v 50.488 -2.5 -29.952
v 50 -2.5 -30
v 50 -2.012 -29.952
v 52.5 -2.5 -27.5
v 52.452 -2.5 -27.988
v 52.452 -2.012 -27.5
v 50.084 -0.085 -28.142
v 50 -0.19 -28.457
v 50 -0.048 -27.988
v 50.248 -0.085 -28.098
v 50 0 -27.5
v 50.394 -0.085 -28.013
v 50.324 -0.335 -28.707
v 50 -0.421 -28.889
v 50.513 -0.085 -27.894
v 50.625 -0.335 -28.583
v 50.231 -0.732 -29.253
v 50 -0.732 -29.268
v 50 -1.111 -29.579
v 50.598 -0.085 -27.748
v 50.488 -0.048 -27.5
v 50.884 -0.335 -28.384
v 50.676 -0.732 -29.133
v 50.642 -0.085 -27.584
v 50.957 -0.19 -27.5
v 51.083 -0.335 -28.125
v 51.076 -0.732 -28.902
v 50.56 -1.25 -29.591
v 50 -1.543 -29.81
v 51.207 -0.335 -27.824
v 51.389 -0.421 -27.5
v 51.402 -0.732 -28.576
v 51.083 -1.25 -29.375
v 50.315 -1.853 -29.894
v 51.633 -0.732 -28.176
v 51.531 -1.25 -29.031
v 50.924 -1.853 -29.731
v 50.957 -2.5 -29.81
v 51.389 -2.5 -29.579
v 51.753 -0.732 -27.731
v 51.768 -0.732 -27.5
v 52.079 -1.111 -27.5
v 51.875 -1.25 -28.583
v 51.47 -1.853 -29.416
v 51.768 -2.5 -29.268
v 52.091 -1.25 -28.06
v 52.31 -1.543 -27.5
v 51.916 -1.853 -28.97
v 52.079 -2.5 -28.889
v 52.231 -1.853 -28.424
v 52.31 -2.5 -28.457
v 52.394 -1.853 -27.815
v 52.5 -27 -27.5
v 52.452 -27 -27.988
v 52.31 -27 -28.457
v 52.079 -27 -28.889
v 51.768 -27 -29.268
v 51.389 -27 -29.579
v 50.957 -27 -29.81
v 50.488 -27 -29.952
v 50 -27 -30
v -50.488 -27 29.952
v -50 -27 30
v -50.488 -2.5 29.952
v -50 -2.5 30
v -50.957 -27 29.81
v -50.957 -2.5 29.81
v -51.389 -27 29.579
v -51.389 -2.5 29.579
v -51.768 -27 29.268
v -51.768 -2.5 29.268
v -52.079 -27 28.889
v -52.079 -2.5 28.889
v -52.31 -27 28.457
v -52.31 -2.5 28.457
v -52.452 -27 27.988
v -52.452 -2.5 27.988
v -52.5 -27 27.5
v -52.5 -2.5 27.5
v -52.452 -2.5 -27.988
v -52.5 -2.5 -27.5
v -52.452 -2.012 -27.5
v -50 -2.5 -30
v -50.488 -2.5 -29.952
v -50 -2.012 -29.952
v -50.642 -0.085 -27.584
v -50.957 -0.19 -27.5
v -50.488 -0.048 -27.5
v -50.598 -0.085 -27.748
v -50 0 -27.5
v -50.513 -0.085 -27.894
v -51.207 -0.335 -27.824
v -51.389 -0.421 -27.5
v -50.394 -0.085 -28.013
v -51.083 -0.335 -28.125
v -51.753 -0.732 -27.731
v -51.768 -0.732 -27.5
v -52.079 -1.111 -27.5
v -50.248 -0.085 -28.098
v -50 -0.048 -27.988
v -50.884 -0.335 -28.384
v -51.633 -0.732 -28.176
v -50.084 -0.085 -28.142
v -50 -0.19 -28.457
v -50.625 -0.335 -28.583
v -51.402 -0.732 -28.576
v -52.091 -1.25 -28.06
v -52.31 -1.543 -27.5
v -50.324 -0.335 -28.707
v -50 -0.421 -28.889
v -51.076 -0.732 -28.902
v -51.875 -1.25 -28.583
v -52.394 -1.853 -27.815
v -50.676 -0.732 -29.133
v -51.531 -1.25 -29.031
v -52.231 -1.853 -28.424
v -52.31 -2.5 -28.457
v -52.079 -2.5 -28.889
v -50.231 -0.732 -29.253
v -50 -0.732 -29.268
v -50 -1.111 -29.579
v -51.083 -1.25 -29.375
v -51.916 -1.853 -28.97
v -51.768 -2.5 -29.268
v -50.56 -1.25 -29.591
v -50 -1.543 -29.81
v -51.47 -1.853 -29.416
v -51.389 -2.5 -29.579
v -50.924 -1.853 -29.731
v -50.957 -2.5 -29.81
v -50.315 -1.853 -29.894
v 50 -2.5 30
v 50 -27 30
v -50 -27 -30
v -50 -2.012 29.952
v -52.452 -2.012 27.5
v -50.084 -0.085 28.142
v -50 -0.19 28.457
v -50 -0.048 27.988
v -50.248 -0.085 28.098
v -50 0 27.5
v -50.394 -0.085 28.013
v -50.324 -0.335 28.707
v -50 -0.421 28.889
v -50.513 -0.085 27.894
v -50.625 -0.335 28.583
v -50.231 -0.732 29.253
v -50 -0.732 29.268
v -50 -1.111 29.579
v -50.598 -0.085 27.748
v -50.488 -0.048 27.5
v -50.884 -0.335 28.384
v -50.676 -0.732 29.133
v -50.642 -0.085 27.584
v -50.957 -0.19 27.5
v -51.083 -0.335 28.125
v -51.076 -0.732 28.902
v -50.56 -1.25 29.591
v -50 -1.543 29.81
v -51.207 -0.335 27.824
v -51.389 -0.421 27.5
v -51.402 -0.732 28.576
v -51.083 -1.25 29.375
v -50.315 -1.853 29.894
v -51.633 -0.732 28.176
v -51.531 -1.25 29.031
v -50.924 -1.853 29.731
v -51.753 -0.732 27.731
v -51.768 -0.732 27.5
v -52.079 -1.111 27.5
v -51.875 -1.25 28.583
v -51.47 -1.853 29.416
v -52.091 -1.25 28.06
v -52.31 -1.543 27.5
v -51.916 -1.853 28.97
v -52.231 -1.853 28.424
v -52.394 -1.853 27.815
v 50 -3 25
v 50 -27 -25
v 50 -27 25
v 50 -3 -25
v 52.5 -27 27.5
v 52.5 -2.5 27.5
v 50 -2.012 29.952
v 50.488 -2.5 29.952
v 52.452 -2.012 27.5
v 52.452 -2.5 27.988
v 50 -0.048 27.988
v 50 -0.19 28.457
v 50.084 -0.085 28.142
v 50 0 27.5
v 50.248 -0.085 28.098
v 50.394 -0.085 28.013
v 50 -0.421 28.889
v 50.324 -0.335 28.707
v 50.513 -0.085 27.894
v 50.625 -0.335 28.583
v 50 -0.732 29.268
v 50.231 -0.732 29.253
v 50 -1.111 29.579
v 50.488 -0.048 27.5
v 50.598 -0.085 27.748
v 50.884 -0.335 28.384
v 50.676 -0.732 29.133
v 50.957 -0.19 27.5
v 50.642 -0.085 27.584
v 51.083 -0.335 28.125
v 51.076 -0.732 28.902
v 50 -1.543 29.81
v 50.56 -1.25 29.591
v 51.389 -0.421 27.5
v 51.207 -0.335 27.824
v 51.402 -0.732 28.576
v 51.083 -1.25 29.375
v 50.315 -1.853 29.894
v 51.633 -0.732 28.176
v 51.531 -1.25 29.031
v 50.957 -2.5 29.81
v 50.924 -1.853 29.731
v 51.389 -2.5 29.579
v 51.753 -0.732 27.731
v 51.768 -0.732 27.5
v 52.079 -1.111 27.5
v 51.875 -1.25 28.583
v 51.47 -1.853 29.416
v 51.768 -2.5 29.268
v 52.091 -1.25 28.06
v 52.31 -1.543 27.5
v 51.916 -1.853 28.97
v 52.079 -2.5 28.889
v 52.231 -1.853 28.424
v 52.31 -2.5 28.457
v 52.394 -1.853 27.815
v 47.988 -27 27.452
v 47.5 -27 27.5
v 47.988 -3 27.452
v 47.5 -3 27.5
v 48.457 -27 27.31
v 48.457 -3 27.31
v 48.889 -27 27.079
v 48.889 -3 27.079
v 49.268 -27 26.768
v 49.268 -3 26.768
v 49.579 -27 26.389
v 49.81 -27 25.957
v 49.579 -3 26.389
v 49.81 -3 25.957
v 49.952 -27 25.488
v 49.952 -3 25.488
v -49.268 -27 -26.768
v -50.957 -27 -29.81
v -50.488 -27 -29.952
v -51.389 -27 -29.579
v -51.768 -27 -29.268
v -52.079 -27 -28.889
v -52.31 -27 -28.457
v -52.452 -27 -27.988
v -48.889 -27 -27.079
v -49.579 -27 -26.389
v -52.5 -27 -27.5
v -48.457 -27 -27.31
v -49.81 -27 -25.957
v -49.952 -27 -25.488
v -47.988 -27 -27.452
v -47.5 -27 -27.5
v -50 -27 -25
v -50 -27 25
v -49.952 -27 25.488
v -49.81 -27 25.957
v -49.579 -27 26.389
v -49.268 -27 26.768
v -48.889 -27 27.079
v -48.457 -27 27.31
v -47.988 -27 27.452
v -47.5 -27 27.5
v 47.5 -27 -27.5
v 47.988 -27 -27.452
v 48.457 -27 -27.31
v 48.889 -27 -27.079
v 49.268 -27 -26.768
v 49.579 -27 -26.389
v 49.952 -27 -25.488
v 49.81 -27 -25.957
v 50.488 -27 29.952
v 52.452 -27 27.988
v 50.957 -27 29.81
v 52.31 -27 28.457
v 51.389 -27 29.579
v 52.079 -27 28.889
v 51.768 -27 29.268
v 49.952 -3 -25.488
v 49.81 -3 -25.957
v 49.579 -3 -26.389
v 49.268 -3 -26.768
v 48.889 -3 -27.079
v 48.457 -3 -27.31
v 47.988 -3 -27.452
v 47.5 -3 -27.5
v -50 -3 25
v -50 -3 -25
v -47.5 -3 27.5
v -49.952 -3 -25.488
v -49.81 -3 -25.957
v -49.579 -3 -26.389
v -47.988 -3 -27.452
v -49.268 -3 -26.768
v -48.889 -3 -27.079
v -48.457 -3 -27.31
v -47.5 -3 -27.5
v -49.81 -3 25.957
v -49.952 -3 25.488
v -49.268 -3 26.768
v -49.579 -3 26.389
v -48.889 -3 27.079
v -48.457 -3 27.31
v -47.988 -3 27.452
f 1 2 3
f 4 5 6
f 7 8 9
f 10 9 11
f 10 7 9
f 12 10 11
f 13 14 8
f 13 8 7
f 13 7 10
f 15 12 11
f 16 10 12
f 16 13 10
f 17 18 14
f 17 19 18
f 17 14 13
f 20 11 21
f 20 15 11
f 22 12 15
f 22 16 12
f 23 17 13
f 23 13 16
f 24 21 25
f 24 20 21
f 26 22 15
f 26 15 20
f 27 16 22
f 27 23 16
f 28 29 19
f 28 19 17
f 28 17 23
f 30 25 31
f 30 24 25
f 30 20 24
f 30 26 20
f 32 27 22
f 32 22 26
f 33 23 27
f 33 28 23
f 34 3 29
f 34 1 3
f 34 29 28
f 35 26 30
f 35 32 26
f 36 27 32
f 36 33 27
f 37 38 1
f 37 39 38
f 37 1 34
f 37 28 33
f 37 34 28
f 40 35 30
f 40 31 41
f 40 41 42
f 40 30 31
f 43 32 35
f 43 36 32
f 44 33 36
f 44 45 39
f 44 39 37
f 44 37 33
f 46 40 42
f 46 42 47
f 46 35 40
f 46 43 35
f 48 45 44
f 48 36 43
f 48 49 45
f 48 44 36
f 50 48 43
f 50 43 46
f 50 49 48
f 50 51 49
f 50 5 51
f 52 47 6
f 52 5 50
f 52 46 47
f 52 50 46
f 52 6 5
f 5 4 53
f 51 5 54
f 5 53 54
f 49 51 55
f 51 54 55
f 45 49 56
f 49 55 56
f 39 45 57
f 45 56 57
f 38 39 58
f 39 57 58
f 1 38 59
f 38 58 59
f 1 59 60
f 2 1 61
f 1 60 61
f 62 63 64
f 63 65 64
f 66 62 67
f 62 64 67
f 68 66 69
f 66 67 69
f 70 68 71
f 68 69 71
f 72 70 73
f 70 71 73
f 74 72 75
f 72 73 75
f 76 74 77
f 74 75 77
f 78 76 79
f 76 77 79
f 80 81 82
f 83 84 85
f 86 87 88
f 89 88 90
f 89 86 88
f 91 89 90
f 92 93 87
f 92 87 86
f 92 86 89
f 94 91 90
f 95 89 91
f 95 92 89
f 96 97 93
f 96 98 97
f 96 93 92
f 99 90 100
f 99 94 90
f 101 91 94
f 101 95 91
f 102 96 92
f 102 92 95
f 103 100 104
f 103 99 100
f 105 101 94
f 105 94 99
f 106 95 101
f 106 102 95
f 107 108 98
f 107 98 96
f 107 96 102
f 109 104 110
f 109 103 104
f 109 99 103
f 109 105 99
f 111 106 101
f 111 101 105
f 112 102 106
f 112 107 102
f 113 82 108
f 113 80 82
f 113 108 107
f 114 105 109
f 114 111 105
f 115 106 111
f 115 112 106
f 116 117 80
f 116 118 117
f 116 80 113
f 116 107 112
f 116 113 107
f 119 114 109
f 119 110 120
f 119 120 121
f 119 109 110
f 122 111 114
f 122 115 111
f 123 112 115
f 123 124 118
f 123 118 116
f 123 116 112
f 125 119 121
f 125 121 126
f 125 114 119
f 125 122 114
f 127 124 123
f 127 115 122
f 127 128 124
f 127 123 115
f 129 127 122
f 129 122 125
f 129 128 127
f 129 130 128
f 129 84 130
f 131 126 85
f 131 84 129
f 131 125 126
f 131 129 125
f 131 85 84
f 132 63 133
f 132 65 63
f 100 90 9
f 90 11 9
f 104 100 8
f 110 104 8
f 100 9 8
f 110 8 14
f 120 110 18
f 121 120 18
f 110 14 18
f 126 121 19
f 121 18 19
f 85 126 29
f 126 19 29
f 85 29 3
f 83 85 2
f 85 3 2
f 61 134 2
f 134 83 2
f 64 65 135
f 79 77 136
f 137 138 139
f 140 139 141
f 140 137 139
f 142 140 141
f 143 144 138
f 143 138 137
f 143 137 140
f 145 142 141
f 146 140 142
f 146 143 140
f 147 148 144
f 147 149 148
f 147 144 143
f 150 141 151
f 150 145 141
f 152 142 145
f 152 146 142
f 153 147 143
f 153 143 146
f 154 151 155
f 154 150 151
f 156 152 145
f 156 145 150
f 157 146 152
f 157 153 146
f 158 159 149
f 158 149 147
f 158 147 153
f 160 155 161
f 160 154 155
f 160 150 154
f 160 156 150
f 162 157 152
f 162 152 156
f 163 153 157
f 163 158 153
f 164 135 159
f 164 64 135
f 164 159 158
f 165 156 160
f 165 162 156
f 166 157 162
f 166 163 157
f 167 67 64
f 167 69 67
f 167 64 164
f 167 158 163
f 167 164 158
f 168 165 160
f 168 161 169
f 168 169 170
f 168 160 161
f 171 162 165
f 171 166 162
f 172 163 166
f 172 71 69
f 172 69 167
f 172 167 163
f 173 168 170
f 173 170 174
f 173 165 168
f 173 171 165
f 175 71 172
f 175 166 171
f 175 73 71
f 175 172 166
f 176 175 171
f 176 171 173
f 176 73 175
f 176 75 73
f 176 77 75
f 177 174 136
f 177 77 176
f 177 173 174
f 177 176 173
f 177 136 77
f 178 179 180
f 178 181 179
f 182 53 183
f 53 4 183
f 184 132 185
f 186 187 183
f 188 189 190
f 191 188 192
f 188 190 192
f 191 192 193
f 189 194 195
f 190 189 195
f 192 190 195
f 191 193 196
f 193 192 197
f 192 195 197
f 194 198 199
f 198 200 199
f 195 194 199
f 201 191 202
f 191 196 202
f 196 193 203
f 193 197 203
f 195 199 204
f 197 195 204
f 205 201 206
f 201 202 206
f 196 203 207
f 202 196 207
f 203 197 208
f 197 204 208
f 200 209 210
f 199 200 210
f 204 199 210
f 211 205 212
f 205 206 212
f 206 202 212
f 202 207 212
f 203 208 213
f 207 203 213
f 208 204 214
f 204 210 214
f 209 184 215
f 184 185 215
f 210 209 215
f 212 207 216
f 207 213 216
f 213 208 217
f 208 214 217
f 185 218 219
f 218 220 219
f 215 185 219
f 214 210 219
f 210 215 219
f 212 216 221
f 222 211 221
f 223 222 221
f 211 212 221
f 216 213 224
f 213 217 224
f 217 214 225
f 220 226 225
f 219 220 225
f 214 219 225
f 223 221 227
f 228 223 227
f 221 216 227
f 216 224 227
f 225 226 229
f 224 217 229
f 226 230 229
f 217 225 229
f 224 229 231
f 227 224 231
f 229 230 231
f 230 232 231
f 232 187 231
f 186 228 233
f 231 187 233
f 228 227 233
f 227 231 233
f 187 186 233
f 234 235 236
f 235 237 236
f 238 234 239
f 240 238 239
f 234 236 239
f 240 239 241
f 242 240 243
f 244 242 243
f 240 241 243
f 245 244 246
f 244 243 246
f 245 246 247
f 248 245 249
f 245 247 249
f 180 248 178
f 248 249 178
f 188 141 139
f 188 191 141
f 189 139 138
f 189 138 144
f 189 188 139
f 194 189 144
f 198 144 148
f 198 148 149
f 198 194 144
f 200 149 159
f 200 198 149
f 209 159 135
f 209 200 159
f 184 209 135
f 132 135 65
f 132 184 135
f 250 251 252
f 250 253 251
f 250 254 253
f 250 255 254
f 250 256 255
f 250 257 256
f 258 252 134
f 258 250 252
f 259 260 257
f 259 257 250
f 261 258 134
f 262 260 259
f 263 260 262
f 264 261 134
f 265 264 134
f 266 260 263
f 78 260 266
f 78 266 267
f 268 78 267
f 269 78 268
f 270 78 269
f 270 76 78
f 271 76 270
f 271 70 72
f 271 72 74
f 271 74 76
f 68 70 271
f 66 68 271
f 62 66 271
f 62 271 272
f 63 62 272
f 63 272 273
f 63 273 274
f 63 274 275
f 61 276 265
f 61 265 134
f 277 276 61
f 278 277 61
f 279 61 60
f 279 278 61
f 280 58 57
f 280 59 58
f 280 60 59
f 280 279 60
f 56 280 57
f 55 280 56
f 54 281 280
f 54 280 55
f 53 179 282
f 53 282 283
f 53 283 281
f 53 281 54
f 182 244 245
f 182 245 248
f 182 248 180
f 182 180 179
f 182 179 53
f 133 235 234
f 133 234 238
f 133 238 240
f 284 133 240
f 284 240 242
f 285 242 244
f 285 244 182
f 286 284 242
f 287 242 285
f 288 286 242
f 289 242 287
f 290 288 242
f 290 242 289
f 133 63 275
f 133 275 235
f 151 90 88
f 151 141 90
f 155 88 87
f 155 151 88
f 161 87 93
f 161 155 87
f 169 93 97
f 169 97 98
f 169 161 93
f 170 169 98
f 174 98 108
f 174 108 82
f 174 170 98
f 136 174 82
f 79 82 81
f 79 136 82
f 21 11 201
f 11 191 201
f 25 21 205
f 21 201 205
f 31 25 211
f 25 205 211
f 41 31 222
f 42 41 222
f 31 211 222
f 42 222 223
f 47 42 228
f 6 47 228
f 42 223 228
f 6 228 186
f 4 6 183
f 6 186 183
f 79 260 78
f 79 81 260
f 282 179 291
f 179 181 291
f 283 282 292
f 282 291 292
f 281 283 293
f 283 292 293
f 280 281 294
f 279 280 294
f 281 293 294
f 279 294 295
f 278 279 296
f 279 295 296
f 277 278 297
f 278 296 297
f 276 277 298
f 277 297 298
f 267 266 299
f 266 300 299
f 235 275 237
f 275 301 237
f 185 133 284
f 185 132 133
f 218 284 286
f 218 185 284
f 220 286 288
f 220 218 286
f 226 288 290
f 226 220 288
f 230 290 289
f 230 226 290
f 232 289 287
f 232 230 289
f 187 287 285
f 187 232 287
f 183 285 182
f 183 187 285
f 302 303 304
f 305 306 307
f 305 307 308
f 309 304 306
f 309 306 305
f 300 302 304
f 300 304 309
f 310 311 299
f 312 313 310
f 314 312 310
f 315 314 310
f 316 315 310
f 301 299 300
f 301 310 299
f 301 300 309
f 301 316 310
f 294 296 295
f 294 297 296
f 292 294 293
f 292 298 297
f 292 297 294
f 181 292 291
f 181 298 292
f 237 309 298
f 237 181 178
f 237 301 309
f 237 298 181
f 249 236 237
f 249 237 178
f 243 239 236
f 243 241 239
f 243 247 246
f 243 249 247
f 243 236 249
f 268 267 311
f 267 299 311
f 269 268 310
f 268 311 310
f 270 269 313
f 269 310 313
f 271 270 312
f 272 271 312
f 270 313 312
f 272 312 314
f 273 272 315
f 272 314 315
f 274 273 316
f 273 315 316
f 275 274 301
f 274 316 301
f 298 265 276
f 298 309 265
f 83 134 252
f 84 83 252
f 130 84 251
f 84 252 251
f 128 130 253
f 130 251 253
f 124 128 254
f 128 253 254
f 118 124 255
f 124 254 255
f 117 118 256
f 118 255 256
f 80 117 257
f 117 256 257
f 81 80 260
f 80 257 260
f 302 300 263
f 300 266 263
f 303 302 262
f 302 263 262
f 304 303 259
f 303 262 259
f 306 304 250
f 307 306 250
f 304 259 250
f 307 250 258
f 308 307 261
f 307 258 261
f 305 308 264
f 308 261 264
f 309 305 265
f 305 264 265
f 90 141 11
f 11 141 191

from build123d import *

# Parameters (mm, degrees)
F0_W        = 105
F0_H        = 60
F0_W_2      = 100
F0_H_2      = 55
F2_DEPTH    = 24
F2_FACE_W   = 105
F2_FACE_H   = 60
F2_FACE_W_2 = 100
F2_FACE_H_2 = 55
F1_R        = 3
F1_R_2      = 1.25
F3_DEPTH    = 3
F4_R        = 2.5


with BuildPart() as f2:
    # F0 (on Front) → F2 (new body)
    with BuildSketch(Plane.XZ):
        Rectangle(F0_W, F0_H)
        Rectangle(F0_W_2, F0_H_2, mode=Mode.SUBTRACT)
    extrude(amount=F2_DEPTH)

    # F0 (on Front) + F2_face (on face) + F1 (on Front) → F3 (join)
    with BuildSketch(Plane.XZ):
        Rectangle(F0_W_2, F0_H_2)
    with BuildSketch(Plane.XZ.offset(24)):
        Rectangle(F2_FACE_W, F2_FACE_H)
        Rectangle(F2_FACE_W_2, F2_FACE_H_2, mode=Mode.SUBTRACT)
    with BuildSketch(Plane.XZ):
        with Locations((-42.9925474213, -21.9911143348)):
            Circle(F1_R)
        with Locations((-42.9925474213, -21.9911143348)):
            Circle(F1_R_2, mode=Mode.SUBTRACT)
        with Locations((-42.9925474213, 22.0088856652)):
            Circle(F1_R)
        with Locations((-42.9925474213, 22.0088856652)):
            Circle(F1_R_2, mode=Mode.SUBTRACT)
        with Locations((43.0074525787, 22.0088856652)):
            Circle(F1_R)
        with Locations((43.0074525787, 22.0088856652)):
            Circle(F1_R_2, mode=Mode.SUBTRACT)
        with Locations((43.0074525787, -21.9911143348)):
            Circle(F1_R)
        with Locations((43.0074525787, -21.9911143348)):
            Circle(F1_R_2, mode=Mode.SUBTRACT)
    extrude(amount=F3_DEPTH)

    # F4
    f4_edges = [f2.edges().sort_by_distance(p)[0] for p in [
        (-52.5, -13.5, -30),
        (52.5, -13.5, -30),
        (52.5, -13.5, 30),
        (-52.5, -13.5, 30),
        (0, 0, 30),
        (-52.5, 0, 0),
        (0, 0, -30),
        (52.5, 0, 0),
        (50, -15, -27.5),
        (-50, -15, -27.5),
        (50, -15, 27.5),
        (-50, -15, 27.5),
    ]]
    fillet(f4_edges, radius=F4_R)


solid = f2.part
